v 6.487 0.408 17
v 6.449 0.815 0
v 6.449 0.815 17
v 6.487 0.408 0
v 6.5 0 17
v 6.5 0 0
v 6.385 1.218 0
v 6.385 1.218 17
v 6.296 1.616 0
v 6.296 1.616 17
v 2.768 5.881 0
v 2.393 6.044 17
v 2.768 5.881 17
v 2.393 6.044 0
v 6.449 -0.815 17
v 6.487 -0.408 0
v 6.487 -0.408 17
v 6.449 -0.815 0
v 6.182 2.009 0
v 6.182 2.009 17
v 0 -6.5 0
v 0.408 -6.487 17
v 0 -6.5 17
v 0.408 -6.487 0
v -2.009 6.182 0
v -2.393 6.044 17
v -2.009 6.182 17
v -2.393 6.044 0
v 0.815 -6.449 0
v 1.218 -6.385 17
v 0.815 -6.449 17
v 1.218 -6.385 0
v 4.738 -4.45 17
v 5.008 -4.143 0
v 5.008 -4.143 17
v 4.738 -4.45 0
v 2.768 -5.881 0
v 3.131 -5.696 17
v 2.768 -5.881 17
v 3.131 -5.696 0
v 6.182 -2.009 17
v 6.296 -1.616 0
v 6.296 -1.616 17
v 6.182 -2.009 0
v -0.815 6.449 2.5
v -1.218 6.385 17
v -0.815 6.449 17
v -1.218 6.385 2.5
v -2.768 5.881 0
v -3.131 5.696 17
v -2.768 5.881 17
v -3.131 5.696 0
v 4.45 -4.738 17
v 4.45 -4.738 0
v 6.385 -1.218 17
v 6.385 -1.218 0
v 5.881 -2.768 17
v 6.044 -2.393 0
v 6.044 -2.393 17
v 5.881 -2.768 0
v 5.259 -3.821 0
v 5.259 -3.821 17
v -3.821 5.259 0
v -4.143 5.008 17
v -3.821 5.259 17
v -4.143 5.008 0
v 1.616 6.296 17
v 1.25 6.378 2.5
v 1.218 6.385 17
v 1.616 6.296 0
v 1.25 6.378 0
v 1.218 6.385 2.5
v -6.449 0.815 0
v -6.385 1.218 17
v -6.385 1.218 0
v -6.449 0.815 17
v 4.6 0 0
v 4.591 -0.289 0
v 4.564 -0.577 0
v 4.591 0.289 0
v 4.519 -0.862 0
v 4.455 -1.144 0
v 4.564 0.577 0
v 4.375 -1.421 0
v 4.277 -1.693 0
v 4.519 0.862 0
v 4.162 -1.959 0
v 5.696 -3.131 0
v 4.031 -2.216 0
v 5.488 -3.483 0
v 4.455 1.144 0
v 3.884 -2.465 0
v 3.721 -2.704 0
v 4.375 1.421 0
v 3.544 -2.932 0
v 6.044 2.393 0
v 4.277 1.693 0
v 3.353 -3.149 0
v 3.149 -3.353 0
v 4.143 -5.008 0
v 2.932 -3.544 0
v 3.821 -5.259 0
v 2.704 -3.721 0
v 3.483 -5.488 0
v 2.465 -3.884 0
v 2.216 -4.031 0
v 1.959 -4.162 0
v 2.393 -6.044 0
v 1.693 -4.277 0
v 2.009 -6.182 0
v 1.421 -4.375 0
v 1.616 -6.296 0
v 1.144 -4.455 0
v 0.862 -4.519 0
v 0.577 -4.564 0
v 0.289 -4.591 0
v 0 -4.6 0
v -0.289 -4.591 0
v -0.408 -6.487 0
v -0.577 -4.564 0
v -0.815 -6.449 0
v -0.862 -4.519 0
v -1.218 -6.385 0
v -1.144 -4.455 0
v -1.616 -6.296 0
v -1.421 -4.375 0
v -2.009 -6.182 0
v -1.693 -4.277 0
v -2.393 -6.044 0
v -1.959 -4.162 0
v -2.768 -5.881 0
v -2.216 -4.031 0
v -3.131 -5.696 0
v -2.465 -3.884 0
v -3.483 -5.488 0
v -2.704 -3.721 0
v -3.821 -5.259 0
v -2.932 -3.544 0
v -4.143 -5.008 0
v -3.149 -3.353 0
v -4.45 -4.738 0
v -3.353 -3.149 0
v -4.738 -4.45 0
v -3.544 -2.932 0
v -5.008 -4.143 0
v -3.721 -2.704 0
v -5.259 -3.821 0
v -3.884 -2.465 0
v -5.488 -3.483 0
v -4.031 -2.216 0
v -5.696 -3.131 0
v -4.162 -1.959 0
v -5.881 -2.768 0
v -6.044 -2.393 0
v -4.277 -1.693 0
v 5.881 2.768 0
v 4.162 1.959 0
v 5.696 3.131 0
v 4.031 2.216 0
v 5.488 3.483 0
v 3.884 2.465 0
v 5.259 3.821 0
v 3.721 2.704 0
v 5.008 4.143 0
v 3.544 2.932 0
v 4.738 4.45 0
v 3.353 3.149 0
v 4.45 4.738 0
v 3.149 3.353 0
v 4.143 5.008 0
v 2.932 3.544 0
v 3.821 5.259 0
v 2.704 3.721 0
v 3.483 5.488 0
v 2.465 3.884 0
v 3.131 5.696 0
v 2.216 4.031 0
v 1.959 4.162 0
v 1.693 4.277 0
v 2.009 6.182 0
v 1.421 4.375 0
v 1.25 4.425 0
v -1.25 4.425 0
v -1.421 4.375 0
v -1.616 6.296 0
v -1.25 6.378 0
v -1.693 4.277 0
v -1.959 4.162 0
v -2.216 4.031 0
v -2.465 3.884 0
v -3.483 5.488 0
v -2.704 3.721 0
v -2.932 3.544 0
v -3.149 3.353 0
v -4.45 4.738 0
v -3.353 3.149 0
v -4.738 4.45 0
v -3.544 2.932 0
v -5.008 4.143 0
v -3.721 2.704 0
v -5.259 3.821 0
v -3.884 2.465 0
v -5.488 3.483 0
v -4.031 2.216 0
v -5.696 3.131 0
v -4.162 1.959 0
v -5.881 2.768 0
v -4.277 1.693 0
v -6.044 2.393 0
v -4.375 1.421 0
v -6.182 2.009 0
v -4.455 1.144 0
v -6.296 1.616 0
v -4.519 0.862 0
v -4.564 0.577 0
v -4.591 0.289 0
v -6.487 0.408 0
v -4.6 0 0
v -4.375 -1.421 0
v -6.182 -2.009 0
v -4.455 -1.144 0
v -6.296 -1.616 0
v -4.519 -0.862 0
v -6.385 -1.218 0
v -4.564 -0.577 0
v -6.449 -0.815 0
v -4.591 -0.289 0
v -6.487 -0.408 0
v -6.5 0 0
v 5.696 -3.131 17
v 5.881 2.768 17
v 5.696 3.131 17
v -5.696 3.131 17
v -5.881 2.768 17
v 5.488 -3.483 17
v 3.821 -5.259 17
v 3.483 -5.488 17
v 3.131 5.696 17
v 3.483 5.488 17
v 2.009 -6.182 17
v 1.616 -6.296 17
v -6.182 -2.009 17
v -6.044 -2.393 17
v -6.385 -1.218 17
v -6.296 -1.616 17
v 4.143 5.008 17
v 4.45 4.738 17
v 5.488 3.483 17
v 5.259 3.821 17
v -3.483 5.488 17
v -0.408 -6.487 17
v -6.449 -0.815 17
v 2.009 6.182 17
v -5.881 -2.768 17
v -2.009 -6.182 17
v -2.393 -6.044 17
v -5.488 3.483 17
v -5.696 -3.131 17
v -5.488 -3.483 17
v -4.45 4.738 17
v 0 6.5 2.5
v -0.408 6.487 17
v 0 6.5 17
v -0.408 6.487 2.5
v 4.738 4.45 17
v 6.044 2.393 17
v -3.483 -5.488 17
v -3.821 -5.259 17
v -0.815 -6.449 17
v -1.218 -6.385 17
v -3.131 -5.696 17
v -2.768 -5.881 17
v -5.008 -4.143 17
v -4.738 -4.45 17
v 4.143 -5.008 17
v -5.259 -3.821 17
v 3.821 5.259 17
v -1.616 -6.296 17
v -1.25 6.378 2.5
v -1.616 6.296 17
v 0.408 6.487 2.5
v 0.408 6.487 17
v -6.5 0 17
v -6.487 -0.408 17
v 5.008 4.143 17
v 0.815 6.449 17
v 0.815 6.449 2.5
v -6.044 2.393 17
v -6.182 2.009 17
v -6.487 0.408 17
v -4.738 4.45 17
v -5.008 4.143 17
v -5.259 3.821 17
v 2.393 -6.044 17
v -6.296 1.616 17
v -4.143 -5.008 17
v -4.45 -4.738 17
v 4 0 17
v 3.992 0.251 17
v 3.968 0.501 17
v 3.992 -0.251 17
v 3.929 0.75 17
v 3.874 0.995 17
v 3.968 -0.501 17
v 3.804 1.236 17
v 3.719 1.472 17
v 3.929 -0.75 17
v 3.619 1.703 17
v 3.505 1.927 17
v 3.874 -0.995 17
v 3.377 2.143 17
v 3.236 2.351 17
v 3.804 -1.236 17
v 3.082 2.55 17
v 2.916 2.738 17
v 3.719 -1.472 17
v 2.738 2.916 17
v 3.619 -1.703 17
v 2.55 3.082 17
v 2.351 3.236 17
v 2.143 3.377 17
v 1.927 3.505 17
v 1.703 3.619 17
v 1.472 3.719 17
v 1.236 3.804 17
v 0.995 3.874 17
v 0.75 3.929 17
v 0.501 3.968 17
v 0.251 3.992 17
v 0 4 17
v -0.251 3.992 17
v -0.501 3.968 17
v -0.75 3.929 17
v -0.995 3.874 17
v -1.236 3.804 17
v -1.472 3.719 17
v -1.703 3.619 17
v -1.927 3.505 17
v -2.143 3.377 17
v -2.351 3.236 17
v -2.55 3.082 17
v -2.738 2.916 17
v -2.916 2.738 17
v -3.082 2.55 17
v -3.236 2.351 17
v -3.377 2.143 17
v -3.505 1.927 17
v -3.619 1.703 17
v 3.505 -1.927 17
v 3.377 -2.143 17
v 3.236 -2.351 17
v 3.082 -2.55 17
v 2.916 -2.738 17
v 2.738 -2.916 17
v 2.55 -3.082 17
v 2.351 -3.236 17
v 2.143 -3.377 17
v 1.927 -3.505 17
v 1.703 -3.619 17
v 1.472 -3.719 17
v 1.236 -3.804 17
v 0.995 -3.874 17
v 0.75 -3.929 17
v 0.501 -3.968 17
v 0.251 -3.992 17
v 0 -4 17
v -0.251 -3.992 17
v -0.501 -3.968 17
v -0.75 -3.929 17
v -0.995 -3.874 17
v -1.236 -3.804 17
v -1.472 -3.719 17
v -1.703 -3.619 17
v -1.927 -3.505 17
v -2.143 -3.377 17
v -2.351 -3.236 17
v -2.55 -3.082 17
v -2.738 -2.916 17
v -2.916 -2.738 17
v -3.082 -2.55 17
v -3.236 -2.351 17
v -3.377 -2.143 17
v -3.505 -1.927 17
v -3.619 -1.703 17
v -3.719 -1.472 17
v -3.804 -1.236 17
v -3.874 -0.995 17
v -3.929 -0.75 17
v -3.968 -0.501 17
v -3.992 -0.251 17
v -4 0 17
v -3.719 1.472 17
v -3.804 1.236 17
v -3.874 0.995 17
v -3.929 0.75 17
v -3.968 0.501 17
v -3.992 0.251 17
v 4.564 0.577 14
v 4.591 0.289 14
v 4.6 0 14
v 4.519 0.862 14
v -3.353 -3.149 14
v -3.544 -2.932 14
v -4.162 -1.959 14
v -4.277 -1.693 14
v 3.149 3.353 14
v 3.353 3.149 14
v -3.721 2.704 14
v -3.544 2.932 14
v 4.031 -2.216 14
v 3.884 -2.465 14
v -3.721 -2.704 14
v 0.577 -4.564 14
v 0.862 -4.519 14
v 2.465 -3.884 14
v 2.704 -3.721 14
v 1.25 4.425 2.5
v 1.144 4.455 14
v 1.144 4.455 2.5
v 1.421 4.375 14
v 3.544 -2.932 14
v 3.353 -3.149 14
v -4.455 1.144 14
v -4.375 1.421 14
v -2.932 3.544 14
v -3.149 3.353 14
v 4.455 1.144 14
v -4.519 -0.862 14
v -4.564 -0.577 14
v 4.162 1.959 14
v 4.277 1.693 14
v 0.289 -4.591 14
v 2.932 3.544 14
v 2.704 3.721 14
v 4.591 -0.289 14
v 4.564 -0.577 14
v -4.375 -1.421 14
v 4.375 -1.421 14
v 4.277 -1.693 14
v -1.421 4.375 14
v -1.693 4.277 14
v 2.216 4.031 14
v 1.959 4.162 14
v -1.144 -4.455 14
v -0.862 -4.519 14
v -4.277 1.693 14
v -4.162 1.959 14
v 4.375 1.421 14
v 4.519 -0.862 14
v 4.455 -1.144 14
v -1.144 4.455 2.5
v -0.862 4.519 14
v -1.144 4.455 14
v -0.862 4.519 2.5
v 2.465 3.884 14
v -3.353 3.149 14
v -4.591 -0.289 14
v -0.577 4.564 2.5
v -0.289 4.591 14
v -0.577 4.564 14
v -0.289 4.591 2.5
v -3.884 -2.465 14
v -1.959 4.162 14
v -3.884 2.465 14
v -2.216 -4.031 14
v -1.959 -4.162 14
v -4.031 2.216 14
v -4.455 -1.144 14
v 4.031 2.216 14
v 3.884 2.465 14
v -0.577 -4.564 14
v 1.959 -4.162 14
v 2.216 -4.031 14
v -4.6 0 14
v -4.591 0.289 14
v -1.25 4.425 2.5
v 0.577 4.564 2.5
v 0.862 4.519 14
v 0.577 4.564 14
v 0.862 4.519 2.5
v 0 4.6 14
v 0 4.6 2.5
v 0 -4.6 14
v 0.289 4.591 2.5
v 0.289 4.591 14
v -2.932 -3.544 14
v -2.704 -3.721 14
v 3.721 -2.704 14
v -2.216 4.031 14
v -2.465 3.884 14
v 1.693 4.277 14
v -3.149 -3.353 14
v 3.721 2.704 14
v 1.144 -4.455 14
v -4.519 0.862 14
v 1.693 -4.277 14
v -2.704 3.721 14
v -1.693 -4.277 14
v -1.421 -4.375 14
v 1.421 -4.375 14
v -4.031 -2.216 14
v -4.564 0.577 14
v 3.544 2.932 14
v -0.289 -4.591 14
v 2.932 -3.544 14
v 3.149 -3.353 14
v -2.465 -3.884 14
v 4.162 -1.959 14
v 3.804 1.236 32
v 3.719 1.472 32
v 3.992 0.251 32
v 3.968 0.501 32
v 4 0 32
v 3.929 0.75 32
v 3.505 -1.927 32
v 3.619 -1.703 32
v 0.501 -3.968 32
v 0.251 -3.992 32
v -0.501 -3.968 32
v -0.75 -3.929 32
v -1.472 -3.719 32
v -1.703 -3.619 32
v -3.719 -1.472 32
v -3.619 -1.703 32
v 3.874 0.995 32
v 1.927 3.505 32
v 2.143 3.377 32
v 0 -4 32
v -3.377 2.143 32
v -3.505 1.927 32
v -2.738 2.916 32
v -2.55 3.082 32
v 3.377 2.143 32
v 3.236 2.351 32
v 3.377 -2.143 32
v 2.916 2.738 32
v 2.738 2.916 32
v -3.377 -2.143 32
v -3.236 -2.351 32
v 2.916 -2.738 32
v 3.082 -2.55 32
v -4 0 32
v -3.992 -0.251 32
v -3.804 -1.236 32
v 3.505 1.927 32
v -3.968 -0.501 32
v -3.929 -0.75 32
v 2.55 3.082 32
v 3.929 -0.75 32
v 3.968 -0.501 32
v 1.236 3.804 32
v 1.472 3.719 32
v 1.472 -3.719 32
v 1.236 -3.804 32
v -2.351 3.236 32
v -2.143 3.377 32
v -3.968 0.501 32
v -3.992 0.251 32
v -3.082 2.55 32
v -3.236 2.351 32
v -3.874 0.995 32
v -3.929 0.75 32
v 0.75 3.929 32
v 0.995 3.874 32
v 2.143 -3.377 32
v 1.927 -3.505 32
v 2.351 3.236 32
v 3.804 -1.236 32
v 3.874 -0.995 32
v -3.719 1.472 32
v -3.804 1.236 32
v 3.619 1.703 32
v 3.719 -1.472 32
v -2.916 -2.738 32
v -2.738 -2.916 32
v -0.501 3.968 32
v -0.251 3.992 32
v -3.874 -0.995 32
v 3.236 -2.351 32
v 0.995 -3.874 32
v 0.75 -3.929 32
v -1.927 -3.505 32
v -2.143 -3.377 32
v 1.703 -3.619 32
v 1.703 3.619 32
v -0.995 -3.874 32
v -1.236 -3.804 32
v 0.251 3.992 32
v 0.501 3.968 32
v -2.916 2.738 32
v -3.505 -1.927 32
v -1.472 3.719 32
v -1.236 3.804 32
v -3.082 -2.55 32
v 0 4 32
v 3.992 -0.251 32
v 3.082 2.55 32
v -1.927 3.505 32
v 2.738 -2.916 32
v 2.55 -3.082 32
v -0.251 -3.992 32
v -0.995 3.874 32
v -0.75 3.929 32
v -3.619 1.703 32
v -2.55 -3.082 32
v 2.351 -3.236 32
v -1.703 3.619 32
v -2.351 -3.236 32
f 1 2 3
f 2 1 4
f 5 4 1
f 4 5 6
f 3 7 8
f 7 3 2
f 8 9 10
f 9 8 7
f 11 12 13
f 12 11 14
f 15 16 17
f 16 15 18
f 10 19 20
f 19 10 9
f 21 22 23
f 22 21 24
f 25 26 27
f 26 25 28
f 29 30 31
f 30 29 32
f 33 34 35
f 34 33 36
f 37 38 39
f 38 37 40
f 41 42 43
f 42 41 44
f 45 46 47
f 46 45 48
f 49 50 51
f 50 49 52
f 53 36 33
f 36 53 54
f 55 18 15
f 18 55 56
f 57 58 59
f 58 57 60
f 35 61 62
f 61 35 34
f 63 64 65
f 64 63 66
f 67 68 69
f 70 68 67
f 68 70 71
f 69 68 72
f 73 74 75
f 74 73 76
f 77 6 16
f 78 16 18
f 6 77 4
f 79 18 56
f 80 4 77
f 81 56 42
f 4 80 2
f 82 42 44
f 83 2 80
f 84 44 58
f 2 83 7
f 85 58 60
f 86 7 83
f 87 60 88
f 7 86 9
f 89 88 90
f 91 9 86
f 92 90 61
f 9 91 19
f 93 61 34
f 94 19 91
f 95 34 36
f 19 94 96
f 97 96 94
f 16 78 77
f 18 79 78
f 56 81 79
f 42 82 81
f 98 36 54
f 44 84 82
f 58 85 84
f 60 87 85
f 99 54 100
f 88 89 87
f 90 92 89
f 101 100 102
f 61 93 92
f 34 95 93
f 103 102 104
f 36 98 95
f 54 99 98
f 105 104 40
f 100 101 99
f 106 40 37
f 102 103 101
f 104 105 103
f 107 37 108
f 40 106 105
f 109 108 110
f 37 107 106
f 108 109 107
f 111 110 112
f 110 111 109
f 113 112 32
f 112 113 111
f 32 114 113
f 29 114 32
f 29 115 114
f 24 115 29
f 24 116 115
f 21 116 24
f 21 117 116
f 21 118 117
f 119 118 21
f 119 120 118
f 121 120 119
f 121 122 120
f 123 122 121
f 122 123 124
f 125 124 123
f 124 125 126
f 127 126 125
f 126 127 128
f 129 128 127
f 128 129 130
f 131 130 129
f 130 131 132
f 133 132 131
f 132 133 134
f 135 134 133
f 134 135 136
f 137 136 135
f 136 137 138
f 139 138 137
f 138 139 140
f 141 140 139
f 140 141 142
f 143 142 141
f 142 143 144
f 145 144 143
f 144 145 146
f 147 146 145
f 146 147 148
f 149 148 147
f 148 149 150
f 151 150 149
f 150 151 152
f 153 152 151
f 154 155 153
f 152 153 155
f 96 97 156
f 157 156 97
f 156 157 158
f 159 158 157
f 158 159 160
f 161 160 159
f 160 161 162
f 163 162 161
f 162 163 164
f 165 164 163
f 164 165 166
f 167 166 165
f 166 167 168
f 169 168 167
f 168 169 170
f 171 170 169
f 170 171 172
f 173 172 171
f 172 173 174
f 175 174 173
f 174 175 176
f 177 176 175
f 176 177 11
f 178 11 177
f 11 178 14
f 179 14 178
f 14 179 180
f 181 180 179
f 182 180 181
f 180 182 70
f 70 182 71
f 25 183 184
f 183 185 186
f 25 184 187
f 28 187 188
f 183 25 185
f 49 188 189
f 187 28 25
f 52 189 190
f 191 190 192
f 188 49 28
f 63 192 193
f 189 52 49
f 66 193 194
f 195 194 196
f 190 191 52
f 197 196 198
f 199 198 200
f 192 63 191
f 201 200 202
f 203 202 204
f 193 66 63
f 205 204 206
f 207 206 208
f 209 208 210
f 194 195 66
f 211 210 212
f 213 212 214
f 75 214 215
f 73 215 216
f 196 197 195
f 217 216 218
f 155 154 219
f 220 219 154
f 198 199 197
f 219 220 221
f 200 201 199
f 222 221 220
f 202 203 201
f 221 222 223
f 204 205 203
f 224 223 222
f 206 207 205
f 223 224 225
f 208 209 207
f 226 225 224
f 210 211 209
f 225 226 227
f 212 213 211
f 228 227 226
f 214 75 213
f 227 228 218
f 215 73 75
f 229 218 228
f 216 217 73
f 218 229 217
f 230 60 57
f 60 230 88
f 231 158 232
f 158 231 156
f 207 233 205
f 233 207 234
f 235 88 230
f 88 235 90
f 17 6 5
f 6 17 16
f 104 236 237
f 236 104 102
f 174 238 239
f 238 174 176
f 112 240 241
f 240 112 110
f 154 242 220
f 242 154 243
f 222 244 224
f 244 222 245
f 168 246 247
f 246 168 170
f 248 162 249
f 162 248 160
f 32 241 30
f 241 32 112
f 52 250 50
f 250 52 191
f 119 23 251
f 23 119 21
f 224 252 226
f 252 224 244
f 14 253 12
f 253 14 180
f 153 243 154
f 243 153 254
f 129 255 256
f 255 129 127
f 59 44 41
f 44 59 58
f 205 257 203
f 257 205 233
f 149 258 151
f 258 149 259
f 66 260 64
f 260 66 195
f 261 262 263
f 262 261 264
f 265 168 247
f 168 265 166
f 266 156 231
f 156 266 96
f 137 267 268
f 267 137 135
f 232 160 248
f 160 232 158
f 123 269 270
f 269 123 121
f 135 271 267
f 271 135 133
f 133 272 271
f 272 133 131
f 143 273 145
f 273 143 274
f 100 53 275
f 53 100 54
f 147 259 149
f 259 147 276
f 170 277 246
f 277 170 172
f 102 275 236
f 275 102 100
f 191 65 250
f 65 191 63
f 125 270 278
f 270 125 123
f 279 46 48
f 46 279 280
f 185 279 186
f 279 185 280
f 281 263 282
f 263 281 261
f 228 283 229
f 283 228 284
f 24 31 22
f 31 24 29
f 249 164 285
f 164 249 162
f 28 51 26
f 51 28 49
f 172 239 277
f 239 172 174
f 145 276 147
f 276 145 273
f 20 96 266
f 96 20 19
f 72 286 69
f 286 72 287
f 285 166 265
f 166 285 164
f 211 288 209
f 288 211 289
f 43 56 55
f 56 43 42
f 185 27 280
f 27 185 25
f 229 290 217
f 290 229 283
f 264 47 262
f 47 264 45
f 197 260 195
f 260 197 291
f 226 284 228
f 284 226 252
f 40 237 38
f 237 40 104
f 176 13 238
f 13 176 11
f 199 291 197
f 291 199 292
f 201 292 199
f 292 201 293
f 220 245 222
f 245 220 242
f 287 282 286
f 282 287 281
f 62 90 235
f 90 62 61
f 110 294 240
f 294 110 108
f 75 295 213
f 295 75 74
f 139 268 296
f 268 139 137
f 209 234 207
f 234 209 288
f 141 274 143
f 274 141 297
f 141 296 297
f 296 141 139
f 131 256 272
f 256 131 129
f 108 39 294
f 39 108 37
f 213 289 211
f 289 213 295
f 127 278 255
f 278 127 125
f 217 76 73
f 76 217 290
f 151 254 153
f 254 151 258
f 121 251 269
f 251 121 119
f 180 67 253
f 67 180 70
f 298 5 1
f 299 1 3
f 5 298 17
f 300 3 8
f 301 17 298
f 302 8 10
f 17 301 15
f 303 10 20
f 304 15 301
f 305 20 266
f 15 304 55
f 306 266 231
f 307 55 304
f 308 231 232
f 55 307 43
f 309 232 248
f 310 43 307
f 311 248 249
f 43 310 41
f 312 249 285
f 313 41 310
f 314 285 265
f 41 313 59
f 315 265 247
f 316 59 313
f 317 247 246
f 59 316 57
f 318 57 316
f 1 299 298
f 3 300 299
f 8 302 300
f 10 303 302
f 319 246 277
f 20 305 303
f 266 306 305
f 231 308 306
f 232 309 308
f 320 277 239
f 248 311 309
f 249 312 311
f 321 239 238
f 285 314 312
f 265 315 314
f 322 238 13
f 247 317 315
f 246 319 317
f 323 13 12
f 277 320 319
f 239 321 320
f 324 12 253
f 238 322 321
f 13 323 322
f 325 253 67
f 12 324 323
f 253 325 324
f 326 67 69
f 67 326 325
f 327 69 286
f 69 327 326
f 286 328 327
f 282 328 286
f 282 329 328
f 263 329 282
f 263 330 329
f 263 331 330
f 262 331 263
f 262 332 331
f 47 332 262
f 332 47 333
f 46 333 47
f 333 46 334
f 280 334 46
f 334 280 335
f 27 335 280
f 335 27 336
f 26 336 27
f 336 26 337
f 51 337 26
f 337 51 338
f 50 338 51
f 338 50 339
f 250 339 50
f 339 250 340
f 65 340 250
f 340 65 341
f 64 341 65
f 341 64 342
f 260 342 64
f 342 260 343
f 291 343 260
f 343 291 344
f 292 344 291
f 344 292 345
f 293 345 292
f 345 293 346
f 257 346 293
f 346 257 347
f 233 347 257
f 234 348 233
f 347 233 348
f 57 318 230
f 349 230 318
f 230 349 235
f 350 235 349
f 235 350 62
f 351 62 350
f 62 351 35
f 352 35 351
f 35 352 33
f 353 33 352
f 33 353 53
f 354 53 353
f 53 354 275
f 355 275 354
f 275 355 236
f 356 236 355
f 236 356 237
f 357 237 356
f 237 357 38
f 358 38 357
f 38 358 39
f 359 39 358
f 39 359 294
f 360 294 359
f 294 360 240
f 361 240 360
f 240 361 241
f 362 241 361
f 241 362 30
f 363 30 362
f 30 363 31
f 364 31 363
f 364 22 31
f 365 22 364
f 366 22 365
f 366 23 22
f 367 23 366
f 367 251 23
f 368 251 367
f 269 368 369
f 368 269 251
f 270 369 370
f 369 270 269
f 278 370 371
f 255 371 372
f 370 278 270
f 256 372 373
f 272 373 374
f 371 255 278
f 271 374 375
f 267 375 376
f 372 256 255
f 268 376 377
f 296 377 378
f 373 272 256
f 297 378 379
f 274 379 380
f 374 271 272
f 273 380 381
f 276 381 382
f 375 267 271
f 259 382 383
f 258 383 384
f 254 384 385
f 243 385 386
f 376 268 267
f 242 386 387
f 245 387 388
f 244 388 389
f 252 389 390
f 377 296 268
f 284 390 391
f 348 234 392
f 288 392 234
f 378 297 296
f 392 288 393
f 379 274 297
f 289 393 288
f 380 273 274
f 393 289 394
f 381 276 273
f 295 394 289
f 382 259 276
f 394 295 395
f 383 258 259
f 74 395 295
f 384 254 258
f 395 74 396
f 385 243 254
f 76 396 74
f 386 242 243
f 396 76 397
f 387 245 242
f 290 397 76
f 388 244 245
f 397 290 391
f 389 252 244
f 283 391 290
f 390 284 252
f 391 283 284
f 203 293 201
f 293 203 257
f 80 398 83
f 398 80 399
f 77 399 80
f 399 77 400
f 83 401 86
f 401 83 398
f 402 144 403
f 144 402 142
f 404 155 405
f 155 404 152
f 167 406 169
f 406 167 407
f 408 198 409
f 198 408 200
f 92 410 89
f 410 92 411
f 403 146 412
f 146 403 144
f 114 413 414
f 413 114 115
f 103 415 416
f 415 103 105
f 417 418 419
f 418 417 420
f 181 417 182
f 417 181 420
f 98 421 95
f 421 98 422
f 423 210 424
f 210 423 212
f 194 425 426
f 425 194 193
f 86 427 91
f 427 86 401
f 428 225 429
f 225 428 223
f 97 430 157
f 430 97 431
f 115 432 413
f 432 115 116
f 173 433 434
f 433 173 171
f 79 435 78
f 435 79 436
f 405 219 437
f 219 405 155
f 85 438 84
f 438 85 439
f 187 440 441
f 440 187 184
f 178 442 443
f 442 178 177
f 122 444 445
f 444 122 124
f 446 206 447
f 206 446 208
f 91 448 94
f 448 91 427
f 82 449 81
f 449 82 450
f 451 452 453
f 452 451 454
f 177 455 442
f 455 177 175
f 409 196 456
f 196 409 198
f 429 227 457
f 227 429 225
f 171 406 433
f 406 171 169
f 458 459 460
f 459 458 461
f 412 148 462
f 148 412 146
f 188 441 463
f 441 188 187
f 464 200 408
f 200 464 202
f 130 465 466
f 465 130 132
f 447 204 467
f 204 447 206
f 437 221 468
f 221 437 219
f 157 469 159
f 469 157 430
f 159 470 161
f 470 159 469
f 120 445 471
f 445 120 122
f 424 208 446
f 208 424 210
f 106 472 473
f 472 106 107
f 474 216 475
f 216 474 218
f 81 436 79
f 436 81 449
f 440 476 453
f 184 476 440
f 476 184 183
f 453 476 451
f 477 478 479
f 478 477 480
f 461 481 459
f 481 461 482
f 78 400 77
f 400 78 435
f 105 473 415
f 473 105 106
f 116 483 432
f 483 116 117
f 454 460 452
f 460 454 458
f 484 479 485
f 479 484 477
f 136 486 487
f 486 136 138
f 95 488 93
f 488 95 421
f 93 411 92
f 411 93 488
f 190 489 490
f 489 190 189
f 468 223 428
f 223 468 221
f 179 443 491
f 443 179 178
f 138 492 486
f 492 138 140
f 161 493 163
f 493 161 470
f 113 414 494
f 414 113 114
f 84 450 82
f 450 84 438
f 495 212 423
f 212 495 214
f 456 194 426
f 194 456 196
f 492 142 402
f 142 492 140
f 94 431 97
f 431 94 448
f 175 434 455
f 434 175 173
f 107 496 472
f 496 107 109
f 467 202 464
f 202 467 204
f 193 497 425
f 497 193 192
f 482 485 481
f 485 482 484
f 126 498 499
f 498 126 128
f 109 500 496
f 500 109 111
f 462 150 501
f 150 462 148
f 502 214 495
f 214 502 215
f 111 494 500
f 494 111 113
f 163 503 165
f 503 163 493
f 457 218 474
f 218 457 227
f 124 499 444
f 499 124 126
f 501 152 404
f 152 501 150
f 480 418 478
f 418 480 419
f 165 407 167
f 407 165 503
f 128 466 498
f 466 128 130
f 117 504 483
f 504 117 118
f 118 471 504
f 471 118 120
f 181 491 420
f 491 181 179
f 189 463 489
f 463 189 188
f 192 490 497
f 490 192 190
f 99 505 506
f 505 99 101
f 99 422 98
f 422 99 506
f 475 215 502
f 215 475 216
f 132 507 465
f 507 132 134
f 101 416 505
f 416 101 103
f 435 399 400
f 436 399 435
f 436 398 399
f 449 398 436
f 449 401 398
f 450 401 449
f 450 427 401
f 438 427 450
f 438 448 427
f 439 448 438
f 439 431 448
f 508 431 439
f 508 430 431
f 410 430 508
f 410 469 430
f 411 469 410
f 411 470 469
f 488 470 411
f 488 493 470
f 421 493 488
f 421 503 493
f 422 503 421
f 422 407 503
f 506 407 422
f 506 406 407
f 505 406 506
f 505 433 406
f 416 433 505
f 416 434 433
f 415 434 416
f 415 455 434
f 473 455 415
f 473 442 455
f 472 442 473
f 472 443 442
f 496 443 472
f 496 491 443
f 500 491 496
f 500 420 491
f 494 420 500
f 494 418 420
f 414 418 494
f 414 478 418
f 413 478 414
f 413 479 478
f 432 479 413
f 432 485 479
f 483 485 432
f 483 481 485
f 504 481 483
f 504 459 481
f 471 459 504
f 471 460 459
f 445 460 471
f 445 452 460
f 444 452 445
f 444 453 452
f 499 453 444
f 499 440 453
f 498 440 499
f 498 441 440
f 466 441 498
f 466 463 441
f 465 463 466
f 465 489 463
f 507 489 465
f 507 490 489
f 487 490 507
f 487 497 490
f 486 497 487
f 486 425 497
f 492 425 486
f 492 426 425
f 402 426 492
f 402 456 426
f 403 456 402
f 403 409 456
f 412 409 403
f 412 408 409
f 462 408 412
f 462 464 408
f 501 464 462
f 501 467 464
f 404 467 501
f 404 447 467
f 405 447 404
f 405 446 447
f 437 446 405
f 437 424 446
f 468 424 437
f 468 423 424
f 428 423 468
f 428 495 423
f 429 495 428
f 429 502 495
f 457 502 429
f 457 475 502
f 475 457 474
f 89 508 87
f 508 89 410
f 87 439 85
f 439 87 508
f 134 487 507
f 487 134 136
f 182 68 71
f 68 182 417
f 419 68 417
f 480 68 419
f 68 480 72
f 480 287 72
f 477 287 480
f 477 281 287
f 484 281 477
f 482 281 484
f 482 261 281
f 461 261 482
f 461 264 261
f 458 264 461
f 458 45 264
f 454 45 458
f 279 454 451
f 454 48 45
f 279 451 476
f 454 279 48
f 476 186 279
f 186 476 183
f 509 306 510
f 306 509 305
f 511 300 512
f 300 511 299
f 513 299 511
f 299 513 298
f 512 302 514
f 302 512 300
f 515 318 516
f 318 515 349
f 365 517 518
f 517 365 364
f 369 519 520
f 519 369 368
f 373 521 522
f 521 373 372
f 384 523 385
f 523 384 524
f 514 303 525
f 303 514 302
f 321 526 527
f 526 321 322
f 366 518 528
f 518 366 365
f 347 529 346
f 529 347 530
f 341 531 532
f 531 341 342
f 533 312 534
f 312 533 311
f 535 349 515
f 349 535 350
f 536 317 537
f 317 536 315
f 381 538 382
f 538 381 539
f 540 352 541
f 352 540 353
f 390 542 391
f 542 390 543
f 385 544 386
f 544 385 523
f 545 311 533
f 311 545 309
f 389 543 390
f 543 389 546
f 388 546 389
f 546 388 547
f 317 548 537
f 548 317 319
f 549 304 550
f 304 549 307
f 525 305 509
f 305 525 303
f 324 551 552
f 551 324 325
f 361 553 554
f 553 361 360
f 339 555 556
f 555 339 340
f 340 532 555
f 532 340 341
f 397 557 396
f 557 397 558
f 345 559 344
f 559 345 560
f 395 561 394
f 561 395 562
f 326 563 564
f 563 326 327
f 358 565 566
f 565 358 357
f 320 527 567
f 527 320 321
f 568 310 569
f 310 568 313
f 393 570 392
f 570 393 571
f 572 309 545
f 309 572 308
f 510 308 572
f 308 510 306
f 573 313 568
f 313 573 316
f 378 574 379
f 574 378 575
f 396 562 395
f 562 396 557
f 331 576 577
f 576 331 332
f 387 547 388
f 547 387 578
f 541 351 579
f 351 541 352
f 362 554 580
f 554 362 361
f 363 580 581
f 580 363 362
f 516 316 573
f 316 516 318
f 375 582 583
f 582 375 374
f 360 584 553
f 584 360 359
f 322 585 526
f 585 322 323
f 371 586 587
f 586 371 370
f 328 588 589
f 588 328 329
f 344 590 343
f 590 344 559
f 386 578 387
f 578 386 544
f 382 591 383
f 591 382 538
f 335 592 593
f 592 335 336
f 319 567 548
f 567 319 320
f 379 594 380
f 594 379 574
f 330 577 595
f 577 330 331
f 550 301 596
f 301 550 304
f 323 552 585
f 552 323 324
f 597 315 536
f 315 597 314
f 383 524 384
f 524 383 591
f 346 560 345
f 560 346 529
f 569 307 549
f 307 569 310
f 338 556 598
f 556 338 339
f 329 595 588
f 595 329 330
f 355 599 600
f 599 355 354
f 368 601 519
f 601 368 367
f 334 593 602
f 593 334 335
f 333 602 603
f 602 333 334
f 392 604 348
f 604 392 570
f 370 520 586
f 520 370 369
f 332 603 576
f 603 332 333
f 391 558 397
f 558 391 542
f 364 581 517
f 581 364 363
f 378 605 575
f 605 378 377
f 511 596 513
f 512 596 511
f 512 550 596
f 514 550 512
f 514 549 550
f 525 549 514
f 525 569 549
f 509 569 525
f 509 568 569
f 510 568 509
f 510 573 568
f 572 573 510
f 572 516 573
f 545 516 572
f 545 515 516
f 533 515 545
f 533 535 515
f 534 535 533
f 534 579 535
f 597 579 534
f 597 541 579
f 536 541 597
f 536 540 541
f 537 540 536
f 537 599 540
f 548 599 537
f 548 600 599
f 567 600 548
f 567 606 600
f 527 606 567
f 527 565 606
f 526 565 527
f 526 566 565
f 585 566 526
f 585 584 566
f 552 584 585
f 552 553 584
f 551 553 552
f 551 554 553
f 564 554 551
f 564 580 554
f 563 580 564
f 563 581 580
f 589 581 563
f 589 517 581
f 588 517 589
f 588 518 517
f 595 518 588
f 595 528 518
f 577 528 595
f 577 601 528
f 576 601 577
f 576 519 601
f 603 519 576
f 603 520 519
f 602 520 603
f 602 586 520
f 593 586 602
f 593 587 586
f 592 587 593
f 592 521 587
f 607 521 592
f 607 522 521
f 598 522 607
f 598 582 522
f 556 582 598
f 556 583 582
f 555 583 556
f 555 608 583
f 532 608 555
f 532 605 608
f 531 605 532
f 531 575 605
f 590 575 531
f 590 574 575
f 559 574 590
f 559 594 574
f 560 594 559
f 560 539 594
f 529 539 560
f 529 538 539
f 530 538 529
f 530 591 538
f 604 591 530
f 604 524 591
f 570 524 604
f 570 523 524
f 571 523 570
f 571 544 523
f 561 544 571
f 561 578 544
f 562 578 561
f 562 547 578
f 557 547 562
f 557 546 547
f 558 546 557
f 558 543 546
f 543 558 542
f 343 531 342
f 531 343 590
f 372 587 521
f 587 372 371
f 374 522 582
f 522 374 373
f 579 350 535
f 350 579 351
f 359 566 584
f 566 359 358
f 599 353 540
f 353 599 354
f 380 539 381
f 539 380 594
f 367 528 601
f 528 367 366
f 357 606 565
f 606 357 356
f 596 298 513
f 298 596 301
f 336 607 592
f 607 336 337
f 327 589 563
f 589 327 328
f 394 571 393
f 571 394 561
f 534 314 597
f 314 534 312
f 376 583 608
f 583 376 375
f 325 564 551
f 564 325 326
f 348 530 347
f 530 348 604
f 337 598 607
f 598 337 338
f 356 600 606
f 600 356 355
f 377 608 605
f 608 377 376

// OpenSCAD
//// Redukce ke spojce
$fn=100;

/// Parametry

//V mikroskopu
dv = 13; // Vnější průměr trubky
dd = 9.2; // Vnitrřní průměr trubky (průměr díry)
hm = 30 - 13; //Výška válce do mikroskopu

// Zářez na čudlík
zs = 2.5;  // Šířka zářezu
zh = 5;  // Hloubka zářezu

// Do spojky
ds = 8; // Průměr konce ve spojce
hs = 15; // Délka osy do spojky


difference() {
cylinder(hm, dv/2, dv/2);

translate([0,0,-3])
cylinder(hm, dd/2, dd/2);

translate([0,dd/2,0])
cube([zs,6,zh], center = true);
}

translate([0,0,hm-1])
cylinder(hs+1, ds/2, ds/2);
